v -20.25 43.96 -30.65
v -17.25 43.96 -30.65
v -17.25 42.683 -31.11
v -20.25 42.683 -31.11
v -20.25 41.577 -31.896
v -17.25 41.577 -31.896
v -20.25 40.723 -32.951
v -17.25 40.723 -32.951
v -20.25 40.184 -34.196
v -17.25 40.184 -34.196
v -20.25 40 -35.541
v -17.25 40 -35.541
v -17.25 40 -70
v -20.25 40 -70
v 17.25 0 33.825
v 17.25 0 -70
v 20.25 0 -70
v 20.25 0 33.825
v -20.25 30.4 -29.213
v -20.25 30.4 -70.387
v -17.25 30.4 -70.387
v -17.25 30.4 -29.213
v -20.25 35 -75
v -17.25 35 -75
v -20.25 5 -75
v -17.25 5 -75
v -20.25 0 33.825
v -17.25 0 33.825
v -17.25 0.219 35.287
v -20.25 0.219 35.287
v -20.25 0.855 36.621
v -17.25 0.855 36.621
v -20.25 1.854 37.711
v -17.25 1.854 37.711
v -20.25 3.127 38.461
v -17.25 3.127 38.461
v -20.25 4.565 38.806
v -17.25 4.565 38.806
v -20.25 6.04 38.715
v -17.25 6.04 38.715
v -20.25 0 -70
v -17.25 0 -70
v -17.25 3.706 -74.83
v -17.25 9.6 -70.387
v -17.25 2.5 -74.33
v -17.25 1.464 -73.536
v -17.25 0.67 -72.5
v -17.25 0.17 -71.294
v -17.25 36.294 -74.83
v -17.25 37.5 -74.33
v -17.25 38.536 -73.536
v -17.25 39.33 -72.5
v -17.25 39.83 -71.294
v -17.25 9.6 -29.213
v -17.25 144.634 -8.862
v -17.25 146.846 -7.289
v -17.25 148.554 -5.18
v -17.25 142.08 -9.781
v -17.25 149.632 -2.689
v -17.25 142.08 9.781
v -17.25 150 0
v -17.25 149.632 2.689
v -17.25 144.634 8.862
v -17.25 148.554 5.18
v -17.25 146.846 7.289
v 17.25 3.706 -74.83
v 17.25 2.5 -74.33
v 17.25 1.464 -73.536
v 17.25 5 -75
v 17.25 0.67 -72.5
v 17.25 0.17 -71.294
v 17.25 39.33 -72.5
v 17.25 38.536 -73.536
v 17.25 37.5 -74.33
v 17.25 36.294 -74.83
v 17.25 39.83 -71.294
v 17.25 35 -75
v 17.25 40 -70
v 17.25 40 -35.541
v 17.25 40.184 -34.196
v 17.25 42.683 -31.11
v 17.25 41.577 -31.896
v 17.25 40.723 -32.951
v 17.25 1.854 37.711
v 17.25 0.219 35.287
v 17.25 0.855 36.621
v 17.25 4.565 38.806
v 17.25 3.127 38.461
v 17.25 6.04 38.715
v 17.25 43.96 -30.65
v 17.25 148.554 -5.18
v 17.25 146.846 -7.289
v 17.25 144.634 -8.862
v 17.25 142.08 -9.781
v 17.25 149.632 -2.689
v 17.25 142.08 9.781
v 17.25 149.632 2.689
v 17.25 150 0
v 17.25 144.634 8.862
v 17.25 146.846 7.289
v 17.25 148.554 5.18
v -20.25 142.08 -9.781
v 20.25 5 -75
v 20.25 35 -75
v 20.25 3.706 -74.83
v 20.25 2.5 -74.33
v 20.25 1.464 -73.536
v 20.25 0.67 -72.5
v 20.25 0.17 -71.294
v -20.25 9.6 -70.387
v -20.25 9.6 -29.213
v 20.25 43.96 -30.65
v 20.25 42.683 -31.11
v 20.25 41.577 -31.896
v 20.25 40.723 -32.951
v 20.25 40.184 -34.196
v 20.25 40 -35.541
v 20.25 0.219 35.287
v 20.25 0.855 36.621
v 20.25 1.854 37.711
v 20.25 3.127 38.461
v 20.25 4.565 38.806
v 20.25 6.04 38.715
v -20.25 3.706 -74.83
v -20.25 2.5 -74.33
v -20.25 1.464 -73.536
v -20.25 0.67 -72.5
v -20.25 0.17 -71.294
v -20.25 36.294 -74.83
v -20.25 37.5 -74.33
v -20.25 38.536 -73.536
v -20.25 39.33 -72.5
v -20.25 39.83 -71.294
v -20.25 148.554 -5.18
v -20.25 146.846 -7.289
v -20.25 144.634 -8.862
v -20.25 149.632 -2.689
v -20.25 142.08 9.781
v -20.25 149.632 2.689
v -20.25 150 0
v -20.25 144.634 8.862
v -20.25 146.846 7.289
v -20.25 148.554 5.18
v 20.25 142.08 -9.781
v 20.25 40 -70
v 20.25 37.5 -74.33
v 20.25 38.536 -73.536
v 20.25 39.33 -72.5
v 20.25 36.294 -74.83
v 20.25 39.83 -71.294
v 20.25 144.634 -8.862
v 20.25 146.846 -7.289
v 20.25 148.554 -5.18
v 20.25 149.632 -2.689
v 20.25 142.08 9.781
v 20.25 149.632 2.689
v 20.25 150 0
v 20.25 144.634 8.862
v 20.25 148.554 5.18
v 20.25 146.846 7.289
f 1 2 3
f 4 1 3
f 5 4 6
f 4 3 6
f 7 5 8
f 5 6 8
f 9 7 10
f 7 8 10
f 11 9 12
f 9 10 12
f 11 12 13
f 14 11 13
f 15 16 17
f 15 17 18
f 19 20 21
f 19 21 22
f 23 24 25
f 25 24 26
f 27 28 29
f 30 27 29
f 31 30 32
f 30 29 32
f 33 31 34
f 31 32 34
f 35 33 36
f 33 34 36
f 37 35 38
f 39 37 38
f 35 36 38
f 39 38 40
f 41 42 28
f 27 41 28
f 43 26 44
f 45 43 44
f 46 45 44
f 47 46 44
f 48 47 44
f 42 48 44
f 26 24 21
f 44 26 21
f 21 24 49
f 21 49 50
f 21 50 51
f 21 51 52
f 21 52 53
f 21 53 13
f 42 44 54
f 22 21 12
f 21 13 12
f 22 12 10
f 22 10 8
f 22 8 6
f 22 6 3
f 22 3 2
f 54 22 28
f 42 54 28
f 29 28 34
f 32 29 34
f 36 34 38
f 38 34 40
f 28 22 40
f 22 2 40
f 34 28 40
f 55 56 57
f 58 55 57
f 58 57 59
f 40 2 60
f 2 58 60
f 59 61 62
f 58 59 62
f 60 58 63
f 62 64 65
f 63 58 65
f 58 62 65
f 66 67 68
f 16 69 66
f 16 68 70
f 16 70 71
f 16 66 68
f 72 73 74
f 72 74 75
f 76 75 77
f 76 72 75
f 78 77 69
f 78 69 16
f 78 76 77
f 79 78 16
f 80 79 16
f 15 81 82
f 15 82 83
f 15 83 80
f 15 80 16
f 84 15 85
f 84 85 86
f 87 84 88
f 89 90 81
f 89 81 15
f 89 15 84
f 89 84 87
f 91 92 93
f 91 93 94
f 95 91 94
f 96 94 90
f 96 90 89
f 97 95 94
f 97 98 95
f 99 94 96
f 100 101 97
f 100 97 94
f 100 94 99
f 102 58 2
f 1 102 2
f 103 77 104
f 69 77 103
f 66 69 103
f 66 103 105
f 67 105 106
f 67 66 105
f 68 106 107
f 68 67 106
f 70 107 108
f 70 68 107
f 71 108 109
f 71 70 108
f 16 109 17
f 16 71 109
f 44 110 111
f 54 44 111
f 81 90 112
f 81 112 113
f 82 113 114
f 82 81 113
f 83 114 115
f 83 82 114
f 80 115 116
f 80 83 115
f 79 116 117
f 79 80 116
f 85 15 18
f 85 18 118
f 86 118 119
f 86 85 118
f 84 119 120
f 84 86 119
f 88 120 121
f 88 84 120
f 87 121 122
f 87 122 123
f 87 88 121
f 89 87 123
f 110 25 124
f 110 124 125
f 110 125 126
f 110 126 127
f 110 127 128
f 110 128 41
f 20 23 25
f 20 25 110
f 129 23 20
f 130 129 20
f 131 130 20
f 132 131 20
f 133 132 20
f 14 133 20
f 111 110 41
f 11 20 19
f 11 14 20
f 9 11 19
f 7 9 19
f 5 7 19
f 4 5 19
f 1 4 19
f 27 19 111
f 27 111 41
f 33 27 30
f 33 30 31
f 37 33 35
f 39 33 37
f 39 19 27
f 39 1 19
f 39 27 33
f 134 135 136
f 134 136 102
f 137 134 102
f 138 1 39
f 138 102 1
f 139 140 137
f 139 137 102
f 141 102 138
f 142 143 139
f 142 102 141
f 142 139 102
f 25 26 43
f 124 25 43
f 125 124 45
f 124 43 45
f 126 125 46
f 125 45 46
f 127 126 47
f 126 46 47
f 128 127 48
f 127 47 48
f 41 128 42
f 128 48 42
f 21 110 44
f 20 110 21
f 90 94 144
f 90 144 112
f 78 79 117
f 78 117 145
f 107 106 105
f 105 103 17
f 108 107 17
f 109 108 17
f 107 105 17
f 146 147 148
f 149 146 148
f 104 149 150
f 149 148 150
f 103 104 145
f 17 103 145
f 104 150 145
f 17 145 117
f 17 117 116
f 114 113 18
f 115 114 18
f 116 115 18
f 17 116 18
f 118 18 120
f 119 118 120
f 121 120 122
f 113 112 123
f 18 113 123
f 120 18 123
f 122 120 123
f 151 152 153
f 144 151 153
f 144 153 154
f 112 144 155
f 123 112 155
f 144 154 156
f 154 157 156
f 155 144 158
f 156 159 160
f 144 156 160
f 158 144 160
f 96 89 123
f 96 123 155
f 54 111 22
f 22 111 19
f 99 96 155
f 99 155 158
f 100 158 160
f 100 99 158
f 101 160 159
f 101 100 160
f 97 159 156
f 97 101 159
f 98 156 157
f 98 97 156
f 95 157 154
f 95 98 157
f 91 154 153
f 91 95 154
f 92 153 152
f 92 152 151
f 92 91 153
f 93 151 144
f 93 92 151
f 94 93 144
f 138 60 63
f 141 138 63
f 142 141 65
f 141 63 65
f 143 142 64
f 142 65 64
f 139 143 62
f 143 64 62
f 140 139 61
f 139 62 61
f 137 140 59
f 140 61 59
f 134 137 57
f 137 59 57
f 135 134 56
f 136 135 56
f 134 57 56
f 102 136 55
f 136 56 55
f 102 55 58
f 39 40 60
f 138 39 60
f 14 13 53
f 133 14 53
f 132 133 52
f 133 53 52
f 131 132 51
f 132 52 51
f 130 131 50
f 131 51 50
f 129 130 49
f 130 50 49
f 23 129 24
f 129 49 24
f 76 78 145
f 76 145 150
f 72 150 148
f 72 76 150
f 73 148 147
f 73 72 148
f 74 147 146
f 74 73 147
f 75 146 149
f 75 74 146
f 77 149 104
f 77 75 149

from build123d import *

# Parameters (mm, degrees)
BOSS_EXTRUDE1_DEPTH     = 3
SKETCH5_W               = 41.17320508
SKETCH5_H               = 20.8
CUT_EXTRUDE1_DEPTH      = 1
CUT_EXTRUDE1_DEPTH_BACK = 3


with BuildPart() as part:
    # Sketch3 → Boss-Extrude1 (new body)
    with BuildSketch(Plane(origin=(17.25, 0, 0), x_dir=(0, 0, -1), z_dir=(1, 0, 0))):
        with BuildLine():
            ThreePointArc((-9.781214465, 142.08034699), (0, 150), (9.781214465, 142.08034699))
            Line((9.781214465, 142.08034699), (30.650272205, 43.959826505))
            ThreePointArc((30.650272205, 43.959826505), (32.394521819, 41.114072345), (35.540879438, 40))
            Line((35.540879438, 40), (70, 40))
            ThreePointArc((70, 40), (73.535533906, 38.535533906), (75, 35))
            Line((75, 35), (75, 5))
            ThreePointArc((75, 5), (73.535533906, 1.464466094), (70, 0))
            Line((70, 0), (0, 0))
            Line((0, 0), (-33.824720318, 0))
            ThreePointArc((-33.824720318, 0), (-37.710647973, 1.853642382), (-38.71532755, 6.040173495))
            Line((-38.71532755, 6.040173495), (-9.781214465, 142.08034699))
        make_face()
    extrude(amount=BOSS_EXTRUDE1_DEPTH)


with BuildPart() as body_2:
    # Mirror2: mirrored copy
    add(part.part.mirror(Plane(origin=(0, 0, 0), x_dir=(0, 0, 1), z_dir=(1, 0, 0))))

    # Sketch5 → Cut-Extrude1 (cut, two sides)
    with BuildSketch(Plane.ZY.offset(20.25)) as cut_extrude1_sk:
        with Locations((-49.8, 20)):
            Rectangle(SKETCH5_W, SKETCH5_H)
    extrude(amount=CUT_EXTRUDE1_DEPTH, mode=Mode.SUBTRACT)
    extrude(cut_extrude1_sk.sketch, amount=-CUT_EXTRUDE1_DEPTH_BACK, mode=Mode.SUBTRACT)


solid = Compound([part.part, body_2.part])
